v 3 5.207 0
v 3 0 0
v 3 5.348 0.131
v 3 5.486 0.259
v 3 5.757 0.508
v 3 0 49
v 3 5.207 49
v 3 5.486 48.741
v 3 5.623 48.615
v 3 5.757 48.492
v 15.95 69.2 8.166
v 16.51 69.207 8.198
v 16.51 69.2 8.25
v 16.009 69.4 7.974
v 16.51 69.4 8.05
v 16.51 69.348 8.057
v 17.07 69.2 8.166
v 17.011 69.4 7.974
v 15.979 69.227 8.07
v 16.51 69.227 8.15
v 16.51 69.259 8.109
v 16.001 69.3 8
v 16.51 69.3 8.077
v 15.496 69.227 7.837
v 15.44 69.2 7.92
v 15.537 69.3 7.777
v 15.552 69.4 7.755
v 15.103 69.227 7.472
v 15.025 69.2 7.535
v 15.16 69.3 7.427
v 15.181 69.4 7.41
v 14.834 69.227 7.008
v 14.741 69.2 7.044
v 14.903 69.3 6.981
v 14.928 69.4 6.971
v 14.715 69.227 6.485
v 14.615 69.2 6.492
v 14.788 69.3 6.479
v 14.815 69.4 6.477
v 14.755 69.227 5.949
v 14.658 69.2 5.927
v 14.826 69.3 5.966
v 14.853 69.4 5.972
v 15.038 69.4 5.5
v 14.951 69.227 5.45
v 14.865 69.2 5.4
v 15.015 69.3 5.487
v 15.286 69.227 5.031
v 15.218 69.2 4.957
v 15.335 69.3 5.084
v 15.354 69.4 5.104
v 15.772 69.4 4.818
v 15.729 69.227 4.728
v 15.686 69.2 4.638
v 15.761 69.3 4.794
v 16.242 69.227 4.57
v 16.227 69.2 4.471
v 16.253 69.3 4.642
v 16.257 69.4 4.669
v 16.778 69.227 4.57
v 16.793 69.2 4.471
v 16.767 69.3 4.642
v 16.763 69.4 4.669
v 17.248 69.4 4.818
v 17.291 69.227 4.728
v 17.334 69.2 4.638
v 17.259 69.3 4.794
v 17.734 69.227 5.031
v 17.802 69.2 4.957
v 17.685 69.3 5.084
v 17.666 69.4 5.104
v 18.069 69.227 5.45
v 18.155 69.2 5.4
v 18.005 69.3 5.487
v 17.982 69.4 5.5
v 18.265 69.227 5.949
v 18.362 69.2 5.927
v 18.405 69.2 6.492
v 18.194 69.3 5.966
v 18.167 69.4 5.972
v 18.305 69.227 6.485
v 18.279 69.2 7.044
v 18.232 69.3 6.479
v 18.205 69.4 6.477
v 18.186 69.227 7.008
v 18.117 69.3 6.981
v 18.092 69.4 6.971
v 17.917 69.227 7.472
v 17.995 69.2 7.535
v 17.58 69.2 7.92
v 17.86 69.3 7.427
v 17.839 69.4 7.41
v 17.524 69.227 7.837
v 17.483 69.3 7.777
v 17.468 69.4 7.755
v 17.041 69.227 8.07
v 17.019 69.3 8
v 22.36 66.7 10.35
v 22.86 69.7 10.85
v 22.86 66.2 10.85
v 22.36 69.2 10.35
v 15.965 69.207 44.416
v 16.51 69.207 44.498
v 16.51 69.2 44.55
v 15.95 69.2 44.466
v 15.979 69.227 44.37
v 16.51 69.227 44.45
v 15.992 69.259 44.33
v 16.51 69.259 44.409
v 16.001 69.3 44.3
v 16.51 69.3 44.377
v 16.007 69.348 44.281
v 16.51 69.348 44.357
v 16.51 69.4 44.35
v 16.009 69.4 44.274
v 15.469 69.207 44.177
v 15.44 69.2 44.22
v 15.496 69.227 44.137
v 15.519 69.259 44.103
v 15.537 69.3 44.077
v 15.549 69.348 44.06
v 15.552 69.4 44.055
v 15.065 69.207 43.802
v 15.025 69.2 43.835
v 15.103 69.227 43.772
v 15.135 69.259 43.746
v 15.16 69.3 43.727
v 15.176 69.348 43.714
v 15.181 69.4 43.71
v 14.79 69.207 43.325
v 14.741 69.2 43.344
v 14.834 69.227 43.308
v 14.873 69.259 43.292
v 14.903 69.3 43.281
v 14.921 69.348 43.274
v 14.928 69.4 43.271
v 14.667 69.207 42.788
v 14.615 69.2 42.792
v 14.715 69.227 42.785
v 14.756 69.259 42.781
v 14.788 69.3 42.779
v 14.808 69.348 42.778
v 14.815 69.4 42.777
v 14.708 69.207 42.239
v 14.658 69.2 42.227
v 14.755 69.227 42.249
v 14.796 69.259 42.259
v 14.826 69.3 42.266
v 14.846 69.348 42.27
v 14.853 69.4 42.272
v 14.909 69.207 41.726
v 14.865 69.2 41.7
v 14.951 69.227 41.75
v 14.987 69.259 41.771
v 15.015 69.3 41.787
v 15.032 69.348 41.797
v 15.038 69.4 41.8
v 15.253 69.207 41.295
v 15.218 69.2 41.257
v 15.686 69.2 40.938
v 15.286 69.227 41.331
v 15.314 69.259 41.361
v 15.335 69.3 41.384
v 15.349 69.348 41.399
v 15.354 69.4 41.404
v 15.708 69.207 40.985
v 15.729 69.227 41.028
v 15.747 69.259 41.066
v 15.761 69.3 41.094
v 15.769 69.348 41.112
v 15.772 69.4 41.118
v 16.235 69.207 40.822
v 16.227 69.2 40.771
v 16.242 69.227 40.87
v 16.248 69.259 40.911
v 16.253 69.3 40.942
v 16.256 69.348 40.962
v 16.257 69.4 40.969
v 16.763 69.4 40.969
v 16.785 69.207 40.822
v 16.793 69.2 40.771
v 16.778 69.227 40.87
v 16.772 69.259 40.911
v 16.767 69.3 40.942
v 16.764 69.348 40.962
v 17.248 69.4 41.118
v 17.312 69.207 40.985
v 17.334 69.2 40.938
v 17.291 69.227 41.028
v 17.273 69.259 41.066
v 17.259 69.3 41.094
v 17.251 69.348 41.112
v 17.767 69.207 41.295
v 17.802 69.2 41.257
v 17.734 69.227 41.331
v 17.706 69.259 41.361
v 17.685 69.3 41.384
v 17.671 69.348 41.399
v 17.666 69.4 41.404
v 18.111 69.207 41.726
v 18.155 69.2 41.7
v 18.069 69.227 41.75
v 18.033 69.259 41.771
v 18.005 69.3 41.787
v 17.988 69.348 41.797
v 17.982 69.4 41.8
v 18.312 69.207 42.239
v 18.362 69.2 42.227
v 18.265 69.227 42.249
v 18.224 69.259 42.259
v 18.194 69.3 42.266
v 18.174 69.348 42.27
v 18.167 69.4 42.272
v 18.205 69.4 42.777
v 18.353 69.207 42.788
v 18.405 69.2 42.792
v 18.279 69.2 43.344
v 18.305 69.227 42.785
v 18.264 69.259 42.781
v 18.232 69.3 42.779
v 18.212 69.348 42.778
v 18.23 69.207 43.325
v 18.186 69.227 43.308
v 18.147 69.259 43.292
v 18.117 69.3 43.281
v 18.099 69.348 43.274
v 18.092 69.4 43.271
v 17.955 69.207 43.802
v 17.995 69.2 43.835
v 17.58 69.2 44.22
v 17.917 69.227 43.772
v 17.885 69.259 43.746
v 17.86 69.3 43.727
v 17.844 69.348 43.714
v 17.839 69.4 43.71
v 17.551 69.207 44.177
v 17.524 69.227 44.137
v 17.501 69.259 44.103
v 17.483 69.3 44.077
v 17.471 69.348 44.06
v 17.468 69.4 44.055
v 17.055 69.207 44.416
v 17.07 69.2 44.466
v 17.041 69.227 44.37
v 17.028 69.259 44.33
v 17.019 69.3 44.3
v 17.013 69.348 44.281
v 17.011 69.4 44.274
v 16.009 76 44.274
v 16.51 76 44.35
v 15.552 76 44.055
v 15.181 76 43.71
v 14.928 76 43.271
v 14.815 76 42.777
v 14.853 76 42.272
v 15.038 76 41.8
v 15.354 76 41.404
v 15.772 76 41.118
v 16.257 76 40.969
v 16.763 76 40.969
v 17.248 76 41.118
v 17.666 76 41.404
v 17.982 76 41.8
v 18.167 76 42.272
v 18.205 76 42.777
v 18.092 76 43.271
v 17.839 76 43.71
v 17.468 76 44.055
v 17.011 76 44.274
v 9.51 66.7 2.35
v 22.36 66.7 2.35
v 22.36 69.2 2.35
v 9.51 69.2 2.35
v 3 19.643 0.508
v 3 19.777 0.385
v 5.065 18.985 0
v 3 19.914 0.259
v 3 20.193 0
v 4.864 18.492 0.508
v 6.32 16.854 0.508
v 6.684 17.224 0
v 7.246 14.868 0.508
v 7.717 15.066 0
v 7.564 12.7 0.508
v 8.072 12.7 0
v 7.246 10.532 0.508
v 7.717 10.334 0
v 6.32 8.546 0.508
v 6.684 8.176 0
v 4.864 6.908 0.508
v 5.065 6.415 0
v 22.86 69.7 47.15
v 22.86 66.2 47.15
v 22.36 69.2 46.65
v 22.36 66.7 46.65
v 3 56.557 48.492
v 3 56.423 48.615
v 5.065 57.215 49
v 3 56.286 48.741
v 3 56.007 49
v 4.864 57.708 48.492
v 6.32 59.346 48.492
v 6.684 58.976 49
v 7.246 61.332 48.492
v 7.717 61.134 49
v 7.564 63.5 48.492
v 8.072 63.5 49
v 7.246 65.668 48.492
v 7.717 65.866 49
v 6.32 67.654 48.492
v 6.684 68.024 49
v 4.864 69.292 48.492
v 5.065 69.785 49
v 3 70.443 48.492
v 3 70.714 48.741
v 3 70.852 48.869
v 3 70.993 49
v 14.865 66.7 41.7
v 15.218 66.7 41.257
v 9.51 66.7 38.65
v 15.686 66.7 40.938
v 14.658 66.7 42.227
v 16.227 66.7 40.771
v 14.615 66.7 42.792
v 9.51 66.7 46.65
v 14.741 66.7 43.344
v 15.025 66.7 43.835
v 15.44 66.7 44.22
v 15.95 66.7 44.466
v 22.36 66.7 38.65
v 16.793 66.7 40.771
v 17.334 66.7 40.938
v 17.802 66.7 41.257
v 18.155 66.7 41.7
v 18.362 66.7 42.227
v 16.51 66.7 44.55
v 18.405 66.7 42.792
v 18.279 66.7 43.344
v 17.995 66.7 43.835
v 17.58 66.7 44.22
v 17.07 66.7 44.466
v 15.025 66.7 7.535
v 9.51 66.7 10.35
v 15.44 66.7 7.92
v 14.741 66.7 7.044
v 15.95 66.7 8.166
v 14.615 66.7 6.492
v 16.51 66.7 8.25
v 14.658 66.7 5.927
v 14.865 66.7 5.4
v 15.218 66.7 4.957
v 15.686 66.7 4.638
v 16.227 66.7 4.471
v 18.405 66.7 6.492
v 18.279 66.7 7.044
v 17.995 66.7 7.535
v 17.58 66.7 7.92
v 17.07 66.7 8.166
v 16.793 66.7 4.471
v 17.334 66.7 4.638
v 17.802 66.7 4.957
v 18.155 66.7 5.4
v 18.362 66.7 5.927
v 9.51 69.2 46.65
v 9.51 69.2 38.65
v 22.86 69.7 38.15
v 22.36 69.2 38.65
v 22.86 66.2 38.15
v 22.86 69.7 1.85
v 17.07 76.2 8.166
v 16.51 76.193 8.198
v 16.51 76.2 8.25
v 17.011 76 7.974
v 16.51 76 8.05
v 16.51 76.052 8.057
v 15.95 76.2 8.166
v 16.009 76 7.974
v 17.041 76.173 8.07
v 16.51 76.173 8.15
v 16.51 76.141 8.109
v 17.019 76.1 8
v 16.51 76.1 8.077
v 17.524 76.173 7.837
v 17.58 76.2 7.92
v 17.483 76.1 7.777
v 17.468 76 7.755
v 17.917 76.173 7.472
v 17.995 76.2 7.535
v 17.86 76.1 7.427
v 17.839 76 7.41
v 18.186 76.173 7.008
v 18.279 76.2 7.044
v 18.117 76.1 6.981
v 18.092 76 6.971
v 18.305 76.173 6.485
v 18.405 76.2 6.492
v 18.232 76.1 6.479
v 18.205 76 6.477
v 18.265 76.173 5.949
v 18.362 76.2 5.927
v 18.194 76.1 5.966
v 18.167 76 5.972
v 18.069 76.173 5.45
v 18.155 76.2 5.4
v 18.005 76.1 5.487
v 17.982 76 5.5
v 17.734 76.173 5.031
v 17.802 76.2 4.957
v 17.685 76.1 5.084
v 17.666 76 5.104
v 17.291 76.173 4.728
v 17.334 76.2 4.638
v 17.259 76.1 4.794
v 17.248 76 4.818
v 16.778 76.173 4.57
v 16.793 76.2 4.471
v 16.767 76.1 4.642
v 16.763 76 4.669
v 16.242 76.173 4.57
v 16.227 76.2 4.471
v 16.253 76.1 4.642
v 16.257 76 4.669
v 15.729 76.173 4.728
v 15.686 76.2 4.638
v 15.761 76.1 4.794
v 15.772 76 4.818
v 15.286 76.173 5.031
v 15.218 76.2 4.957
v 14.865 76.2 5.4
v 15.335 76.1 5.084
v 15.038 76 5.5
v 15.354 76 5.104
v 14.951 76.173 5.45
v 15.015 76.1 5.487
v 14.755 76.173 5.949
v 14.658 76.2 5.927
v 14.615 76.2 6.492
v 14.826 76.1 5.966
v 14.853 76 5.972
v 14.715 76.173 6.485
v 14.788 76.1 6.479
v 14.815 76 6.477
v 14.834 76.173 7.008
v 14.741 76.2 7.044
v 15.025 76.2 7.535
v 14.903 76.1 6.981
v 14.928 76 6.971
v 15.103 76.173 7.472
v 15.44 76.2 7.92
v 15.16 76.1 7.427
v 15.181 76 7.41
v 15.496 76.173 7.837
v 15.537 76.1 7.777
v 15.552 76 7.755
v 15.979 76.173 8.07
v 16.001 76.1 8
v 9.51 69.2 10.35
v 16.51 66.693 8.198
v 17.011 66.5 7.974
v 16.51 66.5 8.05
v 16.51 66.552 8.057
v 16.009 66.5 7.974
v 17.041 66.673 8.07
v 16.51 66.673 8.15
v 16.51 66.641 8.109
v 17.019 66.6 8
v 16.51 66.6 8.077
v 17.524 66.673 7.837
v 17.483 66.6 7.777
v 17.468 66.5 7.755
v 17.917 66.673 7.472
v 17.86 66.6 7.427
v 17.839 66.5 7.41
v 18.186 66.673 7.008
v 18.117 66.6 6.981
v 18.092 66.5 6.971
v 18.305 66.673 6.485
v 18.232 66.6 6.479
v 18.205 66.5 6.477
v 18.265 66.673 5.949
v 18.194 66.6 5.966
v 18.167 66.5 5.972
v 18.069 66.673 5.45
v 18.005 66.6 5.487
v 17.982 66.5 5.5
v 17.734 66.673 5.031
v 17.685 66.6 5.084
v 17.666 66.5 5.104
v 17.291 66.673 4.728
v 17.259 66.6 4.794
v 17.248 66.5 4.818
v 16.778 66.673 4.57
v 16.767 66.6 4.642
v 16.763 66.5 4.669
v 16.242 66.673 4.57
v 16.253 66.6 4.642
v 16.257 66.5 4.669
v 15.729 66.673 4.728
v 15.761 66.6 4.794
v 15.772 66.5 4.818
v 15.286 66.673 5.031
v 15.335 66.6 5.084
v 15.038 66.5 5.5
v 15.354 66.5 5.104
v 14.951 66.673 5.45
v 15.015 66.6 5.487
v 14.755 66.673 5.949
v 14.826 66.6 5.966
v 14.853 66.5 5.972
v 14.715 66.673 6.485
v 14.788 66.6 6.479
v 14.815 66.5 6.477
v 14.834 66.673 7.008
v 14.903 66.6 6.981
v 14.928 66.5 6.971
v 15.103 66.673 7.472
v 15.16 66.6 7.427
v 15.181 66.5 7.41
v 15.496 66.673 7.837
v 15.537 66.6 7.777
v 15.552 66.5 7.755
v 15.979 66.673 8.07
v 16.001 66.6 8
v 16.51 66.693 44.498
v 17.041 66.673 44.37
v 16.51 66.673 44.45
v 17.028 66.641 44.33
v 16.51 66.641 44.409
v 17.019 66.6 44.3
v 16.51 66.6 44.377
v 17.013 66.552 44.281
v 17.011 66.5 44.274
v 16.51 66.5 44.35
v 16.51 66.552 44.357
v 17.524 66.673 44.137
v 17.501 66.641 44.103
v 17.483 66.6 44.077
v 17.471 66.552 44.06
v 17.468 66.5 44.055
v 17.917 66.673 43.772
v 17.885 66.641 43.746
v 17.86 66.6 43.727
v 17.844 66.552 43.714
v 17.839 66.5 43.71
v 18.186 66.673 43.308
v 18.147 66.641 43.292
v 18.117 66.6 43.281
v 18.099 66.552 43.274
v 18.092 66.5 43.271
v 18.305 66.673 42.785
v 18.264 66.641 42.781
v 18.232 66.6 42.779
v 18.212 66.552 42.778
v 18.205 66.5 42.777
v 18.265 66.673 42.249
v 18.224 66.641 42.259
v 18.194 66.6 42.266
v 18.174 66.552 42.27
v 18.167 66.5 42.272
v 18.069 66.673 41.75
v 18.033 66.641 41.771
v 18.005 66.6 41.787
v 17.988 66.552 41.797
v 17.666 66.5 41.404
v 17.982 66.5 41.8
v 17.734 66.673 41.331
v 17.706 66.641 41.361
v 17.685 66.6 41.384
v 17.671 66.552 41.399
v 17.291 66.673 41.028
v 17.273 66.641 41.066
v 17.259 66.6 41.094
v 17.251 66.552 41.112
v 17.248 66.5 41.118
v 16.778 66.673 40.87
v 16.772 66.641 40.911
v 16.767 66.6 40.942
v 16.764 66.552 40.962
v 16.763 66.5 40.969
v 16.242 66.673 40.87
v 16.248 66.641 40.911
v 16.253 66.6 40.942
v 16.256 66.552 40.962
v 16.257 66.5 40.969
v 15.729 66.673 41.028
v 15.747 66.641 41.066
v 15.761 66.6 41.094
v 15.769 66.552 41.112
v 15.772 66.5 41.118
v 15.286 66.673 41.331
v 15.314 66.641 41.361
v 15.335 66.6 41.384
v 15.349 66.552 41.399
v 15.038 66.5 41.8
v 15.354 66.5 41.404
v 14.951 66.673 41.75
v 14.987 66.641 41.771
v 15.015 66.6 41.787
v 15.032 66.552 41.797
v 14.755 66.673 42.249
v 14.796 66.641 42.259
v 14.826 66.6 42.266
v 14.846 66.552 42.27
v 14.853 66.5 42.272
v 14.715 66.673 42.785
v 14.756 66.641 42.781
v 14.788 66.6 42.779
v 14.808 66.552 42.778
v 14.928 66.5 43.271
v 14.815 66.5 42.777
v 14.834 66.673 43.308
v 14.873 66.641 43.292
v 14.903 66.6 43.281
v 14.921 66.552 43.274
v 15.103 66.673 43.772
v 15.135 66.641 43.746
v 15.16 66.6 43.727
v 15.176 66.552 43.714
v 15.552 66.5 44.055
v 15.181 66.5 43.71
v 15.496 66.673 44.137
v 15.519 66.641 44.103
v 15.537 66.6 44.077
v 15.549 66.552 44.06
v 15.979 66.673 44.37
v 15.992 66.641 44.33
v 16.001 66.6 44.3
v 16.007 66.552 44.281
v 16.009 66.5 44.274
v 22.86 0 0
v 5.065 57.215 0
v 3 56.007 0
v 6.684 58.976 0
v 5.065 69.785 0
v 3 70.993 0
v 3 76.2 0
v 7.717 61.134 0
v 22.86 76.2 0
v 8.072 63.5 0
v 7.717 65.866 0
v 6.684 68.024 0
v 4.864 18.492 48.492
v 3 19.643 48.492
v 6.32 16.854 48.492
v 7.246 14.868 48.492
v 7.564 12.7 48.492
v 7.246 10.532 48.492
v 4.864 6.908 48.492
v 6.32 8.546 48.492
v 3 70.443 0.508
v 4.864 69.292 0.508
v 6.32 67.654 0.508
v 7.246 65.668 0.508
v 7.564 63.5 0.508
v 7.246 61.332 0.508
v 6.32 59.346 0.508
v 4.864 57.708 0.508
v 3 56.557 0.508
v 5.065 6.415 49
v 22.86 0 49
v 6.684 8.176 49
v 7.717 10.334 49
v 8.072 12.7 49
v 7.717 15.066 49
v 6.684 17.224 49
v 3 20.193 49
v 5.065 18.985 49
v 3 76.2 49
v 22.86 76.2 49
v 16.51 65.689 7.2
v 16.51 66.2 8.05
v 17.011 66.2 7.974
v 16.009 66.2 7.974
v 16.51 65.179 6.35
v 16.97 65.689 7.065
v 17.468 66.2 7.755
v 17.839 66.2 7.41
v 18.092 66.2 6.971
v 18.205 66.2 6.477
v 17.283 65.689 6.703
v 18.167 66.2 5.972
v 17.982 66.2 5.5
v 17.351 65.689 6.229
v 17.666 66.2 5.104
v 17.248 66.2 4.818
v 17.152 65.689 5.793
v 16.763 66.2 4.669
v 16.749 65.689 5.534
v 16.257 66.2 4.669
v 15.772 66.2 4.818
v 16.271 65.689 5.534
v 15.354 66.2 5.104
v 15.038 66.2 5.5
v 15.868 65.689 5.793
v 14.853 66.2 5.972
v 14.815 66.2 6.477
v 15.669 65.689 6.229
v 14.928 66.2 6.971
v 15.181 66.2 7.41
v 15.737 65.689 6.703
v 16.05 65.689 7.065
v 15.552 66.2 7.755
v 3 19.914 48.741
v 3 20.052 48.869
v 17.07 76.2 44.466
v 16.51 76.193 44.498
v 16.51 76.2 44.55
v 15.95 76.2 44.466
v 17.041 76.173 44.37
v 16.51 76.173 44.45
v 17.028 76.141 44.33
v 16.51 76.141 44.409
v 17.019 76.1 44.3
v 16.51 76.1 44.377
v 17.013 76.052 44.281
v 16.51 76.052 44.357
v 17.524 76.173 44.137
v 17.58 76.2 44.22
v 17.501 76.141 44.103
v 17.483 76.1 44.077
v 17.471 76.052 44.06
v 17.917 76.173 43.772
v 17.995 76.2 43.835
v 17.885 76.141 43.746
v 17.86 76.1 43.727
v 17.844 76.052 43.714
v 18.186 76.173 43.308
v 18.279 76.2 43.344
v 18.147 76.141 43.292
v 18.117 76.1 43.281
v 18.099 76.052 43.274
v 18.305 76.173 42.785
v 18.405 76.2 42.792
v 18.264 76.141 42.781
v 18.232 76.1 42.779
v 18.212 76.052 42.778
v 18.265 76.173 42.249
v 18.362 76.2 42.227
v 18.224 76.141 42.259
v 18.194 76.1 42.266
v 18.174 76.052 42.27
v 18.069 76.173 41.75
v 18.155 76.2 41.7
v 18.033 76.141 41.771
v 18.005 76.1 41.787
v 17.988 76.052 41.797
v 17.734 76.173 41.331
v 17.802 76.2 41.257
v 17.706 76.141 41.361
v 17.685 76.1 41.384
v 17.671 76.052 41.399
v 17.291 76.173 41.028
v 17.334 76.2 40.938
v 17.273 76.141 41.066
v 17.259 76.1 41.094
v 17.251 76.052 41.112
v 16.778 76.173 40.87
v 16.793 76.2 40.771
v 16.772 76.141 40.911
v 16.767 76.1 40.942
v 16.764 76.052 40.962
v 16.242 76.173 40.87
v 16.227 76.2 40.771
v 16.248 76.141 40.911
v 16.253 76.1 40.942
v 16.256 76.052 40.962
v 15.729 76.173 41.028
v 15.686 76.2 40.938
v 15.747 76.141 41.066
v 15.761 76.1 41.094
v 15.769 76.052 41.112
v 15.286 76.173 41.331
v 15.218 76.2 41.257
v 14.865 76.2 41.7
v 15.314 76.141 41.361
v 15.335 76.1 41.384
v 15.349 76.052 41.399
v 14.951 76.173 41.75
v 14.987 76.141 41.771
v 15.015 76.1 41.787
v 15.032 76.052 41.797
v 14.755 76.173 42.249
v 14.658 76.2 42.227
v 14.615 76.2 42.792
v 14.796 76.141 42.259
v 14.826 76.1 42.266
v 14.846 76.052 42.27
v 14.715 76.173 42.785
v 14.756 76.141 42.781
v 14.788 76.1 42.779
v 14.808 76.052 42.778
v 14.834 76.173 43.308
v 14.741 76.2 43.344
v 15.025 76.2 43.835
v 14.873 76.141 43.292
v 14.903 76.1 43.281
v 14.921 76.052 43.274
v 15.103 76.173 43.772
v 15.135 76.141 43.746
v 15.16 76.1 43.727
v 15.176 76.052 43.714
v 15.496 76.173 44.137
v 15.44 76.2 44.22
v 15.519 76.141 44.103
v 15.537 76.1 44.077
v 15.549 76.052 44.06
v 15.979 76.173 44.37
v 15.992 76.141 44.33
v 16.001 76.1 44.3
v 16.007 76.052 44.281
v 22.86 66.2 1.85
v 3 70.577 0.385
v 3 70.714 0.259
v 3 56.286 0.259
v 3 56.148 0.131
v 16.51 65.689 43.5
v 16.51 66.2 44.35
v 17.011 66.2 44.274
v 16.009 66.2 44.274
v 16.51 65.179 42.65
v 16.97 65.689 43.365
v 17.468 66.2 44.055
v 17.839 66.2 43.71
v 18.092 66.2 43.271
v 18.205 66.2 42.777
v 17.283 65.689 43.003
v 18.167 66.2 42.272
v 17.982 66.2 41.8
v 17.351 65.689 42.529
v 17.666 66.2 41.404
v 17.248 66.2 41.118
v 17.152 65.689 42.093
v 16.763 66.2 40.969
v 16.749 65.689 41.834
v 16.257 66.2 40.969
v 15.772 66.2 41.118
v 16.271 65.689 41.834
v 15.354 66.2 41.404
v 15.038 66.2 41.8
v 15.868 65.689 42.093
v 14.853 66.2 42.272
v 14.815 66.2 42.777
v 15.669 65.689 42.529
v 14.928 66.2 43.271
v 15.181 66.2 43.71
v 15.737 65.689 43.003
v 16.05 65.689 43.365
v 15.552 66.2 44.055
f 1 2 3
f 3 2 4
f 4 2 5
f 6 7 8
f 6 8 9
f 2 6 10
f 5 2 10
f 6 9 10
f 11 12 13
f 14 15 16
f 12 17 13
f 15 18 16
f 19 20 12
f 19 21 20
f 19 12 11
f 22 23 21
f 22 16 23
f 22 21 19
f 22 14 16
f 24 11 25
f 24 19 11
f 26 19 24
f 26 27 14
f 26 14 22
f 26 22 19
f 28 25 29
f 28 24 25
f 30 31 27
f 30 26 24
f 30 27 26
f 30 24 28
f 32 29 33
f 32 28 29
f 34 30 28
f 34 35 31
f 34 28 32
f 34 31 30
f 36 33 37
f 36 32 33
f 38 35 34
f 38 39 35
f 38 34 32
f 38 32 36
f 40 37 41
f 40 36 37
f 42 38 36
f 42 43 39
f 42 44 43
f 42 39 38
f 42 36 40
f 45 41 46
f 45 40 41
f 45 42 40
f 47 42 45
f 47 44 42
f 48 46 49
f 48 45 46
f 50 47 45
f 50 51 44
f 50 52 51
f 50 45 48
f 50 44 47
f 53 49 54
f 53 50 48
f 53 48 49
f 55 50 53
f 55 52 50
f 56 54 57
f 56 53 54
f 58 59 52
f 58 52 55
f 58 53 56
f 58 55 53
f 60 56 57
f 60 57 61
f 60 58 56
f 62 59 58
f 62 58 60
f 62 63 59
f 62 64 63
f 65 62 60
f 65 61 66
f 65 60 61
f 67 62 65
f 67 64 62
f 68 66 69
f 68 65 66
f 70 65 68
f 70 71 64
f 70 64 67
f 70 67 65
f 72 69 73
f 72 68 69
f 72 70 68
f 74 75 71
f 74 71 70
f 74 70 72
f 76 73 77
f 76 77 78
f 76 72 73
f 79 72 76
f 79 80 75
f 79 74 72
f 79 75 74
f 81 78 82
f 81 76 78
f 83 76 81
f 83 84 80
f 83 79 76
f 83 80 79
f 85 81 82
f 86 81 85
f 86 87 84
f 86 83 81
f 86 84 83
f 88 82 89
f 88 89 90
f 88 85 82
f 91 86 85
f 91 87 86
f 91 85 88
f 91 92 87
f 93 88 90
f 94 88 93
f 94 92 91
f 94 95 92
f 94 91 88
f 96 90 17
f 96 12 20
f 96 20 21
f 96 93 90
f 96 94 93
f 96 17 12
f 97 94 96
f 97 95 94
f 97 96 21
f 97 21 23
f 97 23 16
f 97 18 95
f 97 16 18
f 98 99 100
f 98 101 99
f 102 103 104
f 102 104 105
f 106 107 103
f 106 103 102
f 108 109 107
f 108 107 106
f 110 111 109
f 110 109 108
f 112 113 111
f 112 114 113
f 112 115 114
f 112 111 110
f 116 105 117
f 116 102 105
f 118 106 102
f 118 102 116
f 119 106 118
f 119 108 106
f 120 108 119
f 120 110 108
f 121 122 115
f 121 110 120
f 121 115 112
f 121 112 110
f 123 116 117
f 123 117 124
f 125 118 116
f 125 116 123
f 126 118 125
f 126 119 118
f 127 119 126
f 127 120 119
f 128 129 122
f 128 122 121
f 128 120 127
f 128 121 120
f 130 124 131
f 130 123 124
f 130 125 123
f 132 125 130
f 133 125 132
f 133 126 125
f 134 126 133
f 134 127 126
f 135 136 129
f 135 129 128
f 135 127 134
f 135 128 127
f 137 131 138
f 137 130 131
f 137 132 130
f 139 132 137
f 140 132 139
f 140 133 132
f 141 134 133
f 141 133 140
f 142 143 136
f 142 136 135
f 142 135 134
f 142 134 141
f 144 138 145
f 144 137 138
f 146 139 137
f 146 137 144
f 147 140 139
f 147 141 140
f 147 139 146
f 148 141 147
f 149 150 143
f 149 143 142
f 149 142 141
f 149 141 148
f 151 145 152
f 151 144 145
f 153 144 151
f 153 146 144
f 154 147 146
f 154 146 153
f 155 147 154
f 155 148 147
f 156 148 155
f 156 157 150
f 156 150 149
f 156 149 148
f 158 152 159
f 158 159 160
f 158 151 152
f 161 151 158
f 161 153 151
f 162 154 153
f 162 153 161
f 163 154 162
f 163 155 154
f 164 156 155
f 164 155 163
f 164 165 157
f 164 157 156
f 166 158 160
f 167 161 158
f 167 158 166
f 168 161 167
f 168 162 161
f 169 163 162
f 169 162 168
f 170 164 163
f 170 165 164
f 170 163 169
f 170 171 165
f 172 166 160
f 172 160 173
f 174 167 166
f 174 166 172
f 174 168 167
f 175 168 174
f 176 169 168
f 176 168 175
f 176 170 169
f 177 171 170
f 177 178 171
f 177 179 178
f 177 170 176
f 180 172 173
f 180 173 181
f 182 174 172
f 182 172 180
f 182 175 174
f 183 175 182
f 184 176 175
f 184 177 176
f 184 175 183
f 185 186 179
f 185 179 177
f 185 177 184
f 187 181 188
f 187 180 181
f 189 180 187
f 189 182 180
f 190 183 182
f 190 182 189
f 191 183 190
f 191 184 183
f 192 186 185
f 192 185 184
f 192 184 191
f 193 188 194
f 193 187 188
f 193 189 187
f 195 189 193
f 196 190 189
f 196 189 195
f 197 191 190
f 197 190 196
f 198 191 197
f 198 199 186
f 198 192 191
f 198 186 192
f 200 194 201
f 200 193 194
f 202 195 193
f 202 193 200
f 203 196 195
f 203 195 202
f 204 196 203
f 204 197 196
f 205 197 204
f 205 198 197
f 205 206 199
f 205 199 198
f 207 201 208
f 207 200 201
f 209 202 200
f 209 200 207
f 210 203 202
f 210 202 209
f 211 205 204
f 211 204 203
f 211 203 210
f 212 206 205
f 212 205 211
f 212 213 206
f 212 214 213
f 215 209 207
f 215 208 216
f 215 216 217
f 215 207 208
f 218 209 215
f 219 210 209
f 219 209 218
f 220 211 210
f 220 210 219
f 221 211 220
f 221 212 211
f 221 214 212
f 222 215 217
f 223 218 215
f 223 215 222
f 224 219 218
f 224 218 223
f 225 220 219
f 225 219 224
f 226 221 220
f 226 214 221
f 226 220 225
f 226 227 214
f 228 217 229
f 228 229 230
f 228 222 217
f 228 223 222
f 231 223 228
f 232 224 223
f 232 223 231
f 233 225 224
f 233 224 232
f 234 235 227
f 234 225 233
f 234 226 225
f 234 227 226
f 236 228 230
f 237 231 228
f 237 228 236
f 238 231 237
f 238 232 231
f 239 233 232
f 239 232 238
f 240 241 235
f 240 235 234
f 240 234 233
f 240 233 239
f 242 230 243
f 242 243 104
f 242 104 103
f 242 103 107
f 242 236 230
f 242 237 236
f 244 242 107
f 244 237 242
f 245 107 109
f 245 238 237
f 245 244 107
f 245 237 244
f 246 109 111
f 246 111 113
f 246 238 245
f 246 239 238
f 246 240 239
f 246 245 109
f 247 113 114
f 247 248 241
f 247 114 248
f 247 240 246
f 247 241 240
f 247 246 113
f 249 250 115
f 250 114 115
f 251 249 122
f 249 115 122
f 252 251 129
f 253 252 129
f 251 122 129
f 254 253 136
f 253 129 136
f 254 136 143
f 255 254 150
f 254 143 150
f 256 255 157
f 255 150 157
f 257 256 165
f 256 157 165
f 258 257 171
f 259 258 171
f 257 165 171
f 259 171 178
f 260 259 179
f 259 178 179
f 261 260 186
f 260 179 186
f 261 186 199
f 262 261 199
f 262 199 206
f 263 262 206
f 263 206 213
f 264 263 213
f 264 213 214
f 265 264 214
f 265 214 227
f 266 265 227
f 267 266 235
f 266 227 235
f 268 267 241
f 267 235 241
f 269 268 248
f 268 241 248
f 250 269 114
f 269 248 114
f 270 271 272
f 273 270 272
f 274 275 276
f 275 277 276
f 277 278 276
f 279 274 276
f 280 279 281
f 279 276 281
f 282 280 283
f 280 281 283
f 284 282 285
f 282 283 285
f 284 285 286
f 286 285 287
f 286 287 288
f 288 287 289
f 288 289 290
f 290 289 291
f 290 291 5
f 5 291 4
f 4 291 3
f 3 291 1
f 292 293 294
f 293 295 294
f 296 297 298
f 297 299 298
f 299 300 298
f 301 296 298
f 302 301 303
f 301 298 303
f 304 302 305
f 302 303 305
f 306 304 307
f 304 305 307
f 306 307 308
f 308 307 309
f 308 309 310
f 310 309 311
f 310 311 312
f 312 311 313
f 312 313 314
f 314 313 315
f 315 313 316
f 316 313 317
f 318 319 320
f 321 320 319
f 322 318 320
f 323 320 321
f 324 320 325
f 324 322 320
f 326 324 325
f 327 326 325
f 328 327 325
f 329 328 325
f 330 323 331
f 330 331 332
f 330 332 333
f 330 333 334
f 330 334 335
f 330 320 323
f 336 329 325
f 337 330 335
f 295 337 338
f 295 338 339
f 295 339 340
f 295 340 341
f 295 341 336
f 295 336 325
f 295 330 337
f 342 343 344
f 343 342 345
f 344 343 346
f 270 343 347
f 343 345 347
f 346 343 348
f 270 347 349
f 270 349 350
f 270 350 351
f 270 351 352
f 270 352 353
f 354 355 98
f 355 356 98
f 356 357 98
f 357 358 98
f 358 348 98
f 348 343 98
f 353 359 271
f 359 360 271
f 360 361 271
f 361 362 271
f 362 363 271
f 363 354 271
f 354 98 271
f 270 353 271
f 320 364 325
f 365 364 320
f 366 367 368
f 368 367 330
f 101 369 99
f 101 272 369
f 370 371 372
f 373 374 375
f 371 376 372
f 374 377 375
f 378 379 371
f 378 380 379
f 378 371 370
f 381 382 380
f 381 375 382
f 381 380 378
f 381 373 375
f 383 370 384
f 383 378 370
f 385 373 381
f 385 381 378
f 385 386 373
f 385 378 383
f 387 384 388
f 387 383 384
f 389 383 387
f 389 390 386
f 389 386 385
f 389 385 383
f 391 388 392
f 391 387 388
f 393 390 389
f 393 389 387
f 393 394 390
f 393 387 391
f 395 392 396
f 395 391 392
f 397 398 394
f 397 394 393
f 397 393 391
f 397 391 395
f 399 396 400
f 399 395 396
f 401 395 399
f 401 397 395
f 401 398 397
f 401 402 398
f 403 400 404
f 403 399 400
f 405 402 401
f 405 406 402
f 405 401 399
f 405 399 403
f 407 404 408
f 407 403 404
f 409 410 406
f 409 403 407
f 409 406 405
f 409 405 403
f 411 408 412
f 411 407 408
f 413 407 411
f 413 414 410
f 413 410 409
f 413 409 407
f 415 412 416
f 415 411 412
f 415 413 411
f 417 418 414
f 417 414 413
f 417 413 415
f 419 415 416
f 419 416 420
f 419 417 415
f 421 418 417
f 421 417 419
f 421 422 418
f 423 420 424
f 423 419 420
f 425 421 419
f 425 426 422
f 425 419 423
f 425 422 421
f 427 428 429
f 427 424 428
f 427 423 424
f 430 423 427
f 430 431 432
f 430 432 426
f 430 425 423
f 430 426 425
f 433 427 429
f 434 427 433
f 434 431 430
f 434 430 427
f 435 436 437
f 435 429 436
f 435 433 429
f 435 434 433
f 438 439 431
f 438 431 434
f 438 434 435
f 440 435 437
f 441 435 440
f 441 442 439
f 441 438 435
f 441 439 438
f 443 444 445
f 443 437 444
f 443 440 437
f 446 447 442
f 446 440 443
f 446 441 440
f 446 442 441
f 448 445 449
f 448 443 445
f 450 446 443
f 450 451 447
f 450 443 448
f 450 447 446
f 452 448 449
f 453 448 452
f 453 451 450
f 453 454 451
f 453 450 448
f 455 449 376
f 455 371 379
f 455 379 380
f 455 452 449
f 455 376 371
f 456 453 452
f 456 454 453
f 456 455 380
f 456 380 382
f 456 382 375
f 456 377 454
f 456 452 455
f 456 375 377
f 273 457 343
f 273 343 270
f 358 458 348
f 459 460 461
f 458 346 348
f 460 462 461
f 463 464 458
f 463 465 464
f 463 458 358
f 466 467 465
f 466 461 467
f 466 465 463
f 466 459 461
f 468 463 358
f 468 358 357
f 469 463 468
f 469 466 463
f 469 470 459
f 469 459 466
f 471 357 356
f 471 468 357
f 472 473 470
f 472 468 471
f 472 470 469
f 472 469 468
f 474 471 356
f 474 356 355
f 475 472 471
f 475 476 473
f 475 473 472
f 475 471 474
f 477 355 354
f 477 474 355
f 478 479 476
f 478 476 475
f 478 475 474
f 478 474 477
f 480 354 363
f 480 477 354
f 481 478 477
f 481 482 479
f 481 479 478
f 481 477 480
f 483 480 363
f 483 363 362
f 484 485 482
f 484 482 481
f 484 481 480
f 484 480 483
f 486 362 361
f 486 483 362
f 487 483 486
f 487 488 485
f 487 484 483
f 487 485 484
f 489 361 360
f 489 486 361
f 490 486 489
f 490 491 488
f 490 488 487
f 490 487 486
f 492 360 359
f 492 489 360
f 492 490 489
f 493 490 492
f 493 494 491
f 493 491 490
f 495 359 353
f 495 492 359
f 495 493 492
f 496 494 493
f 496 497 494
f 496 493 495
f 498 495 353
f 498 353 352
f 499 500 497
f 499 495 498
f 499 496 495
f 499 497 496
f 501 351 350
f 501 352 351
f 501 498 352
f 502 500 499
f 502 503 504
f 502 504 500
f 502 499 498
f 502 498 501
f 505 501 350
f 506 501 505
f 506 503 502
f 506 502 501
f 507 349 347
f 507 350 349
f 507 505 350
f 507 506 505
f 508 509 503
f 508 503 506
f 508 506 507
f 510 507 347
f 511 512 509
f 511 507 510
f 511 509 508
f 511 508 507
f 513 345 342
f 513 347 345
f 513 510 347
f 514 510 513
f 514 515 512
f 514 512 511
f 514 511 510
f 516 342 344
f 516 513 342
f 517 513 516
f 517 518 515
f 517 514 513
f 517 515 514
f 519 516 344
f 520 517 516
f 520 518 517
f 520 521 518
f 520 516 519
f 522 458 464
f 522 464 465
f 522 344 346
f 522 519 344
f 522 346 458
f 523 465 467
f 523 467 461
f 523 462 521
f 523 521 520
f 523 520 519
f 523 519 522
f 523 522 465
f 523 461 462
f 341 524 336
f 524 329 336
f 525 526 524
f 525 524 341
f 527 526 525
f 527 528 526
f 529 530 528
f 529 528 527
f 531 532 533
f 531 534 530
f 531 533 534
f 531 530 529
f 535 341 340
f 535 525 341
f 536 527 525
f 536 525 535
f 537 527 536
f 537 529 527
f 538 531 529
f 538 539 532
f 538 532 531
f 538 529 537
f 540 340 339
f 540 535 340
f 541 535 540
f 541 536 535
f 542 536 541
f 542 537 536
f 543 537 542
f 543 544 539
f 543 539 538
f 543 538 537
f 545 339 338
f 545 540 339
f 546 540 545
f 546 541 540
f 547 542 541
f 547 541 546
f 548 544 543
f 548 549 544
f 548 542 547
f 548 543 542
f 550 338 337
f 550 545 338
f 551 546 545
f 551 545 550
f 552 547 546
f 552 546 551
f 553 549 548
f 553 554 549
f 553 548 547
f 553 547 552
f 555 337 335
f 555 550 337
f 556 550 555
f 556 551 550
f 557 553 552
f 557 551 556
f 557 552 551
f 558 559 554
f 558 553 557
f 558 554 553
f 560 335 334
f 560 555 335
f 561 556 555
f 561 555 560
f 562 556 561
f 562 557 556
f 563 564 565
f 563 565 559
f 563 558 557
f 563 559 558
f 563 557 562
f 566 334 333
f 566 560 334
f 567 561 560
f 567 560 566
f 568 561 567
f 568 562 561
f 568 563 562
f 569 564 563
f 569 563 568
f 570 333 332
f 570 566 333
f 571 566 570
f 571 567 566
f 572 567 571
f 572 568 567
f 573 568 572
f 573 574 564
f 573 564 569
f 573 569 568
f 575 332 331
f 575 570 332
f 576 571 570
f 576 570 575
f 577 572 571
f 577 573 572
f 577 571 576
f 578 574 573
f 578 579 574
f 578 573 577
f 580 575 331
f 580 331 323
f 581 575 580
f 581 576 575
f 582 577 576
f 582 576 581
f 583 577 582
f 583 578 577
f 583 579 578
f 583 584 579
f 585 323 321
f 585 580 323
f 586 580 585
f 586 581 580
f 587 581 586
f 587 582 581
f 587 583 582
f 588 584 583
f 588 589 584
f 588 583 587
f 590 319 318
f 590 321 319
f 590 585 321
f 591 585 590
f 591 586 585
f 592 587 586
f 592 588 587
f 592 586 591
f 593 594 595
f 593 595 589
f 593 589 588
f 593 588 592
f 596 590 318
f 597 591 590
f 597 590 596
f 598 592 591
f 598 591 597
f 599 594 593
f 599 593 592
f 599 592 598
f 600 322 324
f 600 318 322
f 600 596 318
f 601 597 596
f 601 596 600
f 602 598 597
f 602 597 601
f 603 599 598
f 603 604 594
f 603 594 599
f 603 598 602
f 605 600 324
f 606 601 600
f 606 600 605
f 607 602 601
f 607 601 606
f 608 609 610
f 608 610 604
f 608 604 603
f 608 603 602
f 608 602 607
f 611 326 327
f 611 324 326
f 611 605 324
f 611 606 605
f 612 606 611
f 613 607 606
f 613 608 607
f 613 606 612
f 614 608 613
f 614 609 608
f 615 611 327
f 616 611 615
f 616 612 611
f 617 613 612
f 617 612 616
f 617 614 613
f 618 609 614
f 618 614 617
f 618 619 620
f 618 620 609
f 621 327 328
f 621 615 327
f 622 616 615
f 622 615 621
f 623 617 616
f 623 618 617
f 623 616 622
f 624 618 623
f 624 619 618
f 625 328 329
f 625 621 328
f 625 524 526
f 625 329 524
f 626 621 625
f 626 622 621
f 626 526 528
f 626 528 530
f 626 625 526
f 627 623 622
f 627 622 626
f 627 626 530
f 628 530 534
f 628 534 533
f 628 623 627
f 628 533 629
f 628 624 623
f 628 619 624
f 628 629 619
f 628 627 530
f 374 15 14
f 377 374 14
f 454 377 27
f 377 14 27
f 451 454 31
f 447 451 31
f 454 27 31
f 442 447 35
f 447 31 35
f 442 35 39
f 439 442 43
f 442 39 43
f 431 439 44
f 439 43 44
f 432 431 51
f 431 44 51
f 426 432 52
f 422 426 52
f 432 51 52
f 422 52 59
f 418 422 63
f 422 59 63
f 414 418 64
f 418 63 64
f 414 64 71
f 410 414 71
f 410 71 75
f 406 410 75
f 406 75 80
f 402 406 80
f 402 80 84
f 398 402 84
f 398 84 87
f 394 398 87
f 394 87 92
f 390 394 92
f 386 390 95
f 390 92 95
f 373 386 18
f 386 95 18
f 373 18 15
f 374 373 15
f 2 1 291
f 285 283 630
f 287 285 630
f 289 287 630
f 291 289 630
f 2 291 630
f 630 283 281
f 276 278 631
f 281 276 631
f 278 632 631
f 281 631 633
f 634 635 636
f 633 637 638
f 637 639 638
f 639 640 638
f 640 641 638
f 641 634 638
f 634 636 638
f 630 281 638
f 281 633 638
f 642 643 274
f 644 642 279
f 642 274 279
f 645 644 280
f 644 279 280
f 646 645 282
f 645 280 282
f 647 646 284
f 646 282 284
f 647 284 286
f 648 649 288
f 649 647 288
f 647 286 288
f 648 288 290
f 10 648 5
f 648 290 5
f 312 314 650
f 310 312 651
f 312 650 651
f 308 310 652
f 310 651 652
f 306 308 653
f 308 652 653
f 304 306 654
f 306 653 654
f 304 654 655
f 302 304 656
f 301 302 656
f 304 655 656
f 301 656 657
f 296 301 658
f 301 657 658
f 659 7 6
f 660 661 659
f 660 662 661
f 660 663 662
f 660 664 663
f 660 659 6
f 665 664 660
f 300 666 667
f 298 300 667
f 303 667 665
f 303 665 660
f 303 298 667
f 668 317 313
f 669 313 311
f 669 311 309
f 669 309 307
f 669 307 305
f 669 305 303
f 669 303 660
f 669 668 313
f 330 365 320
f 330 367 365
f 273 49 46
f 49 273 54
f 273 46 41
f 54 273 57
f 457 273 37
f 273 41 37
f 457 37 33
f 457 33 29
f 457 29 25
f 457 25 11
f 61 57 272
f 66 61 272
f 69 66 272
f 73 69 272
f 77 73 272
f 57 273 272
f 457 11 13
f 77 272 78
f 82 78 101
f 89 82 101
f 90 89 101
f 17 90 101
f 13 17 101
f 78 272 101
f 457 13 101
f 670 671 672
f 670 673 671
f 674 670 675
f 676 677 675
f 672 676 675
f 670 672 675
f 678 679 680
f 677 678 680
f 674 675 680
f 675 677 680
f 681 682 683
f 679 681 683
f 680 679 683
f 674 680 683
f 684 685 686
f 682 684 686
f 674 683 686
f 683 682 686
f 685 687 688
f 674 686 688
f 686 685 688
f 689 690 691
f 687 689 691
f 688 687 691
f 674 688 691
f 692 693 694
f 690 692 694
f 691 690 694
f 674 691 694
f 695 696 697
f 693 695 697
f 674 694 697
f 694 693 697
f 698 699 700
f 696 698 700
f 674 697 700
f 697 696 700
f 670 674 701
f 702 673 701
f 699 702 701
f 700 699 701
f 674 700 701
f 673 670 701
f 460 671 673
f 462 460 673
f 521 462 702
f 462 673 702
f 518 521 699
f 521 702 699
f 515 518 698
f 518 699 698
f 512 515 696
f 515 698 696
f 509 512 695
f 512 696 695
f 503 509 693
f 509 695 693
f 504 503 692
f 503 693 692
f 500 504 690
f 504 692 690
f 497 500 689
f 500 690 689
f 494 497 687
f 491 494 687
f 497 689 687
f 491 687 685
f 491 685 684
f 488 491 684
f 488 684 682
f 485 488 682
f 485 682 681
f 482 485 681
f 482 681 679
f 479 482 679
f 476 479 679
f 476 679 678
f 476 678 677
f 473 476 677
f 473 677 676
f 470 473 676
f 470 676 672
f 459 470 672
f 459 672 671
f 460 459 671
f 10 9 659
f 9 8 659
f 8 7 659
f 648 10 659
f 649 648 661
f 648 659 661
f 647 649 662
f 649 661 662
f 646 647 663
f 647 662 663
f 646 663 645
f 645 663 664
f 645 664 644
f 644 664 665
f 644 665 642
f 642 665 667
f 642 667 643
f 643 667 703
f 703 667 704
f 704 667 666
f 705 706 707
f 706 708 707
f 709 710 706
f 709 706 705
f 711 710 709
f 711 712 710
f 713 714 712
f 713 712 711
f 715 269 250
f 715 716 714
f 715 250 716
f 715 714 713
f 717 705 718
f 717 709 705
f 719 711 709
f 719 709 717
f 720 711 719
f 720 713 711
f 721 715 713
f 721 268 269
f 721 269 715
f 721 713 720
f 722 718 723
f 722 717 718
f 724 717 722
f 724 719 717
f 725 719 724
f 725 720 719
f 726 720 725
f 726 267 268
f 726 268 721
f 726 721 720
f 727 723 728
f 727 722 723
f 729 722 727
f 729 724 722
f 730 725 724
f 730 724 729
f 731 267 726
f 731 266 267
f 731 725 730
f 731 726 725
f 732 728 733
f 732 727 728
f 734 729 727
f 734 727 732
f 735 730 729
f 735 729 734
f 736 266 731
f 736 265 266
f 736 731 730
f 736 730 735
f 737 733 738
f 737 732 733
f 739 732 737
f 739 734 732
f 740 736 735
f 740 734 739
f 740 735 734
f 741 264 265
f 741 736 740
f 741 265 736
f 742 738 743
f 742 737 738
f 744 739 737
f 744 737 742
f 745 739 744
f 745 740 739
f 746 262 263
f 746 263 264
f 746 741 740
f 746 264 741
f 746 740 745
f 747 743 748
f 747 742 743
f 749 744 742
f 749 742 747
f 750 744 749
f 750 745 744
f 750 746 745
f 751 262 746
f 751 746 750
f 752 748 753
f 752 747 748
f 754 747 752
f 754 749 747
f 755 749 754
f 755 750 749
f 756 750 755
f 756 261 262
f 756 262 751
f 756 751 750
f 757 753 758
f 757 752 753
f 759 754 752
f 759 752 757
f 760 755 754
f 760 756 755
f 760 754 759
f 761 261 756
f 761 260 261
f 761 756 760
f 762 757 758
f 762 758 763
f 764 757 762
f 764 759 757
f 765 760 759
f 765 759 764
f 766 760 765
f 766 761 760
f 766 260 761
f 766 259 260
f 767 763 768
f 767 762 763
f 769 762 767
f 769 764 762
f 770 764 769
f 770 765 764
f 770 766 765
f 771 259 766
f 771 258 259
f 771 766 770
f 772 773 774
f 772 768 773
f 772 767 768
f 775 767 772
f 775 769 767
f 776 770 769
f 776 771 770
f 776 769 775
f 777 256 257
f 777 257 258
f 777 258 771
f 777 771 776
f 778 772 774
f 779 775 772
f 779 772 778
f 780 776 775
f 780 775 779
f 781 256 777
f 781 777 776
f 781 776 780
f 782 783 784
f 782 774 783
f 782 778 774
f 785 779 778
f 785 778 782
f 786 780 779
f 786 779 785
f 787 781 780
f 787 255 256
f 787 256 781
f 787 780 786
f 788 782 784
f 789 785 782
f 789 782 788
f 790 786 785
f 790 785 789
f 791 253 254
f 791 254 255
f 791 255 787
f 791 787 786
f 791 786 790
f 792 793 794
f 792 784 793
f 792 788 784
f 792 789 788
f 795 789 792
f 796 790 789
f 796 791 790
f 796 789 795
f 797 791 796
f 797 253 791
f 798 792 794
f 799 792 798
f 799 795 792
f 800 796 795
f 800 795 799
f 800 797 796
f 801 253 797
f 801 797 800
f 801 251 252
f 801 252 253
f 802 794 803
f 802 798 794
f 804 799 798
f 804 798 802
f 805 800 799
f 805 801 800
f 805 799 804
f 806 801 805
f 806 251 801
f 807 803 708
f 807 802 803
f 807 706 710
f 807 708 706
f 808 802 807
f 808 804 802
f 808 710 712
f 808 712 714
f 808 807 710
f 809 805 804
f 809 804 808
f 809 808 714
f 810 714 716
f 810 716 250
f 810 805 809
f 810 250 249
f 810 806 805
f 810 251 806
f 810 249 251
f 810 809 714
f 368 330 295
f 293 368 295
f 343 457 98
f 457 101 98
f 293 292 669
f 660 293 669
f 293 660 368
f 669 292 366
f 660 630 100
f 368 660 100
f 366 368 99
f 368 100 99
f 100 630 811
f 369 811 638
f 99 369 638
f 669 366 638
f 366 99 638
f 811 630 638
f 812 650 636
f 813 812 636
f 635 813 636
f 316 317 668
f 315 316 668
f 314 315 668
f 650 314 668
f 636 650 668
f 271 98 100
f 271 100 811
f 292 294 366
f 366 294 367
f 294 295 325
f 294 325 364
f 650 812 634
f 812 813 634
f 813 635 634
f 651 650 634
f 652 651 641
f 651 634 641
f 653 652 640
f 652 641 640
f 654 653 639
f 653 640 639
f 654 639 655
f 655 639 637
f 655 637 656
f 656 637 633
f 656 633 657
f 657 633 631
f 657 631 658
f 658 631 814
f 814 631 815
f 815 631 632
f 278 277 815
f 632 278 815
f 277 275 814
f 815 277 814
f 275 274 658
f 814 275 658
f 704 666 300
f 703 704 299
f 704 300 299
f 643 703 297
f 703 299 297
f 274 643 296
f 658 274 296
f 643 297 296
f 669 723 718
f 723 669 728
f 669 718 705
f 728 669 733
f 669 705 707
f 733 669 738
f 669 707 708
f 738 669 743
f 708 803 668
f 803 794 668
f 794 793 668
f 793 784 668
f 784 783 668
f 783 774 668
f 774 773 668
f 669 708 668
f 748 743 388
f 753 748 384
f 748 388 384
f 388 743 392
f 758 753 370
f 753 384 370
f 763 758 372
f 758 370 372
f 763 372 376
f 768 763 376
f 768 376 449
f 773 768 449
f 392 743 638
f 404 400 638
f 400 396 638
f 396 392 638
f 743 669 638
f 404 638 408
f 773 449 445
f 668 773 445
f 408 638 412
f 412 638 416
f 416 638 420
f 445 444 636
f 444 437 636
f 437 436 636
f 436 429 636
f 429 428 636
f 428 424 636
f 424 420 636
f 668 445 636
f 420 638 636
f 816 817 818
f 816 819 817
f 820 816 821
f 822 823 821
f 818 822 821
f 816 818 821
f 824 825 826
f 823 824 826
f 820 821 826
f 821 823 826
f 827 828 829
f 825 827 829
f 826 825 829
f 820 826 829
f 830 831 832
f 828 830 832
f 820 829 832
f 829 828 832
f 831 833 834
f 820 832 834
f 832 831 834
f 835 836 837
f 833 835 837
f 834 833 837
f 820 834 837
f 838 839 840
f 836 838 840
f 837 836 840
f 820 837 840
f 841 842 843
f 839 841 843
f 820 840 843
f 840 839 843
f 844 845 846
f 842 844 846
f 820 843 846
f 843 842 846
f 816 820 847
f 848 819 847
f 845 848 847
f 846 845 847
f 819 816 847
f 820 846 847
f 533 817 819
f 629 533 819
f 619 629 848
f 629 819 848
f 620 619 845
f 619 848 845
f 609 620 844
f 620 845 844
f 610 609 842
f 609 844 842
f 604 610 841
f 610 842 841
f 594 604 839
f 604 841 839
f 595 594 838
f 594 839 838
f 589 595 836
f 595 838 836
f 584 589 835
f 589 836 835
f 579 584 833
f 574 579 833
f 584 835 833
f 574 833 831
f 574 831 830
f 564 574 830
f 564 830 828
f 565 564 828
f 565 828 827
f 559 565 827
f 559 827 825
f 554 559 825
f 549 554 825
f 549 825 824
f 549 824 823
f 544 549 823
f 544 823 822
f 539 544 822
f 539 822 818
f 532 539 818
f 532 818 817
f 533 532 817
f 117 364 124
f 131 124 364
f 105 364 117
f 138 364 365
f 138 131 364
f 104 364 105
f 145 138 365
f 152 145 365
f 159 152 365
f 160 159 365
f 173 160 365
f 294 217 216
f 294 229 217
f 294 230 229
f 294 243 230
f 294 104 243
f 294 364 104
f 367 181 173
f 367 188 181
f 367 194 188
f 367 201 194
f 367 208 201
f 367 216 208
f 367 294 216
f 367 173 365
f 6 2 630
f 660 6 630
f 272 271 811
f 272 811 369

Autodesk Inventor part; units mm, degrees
ref_plane "XZ Plane" through (0, 0, 0) normal (0, 1, 0) x (-1, 0, 0)
sketch "Sketch1" plane through (0, 0, 0) normal (0, 0, 1) x (1, 0, 0)
  line L0 (-22.86, 0) -> (22.86, 0)
  line L1 (22.86, 0) -> (22.86, 76.2)
  line L2 (22.86, 76.2) -> (-22.86, 76.2)
  line L3 (-22.86, 76.2) -> (-22.86, 0)
  circle A0 centre (0, 63.5) radius 7.5635
  circle A1 centre (0, 12.7) radius 7.5635
  point P0 (0, 0)
  point P1 (0, 76.2)
  point P2 (0, 0)
  dimension "d0" = 76.2
  dimension "d1" = 15.127
  dimension "d2" = 15.127
  dimension "d3" = 45.72
  dimension "d4" = 12.7
  dimension "d5" = 50.8
  dimension "d7" = 12.7
  dimension "d8" = 0
extrude "Extrusion1" add sketch "Sketch1" along normal blind 49
chamfer "Chamfer1" distance 0.508 angle 45 4 edges at (-7.5635, 63.5, 49) (-7.5635, 12.7, 49) (-7.5635, 63.5, 0) (-7.5635, 12.7, 0)
ref_plane "Work Plane1" through (0, 0, 0) normal (1, 0, 0) x (0, 1, 0)
ref_plane "Work Plane2" through (3, 0, 0) normal (1, 0, 0) x (0, 1, 0)
sketch "Sketch4" plane through (3, 0, 0) normal (1, 0, 0) x (0, 1, 0)
  line L0 (80.0176, -3.1701) -> (-4.1539, -3.1701)
  line L1 (-4.1539, -3.1701) -> (-4.1539, 52.5799)
  line L2 (-4.1539, 52.5799) -> (80.0176, 52.5799)
  line L3 (80.0176, 52.5799) -> (80.0176, -3.1701)
  point P0 (0, 0)
extrude "Extrusion3" cut sketch "Sketch4" against normal blind 100
sketch "Sketch5" plane through (22.86, 76.2, 49) normal (0, 1, 0) x (1, 0, 0)
  circle A0 centre (-6.35, 42.65) radius 2.6622
  circle A1 centre (-6.35, 6.35) radius 2.7742
  line L0 (0, 49) -> (0, 0) projected
  line L1 (0, 49) -> (-19.86, 49) projected
  line L2 (0, 0) -> (-19.86, 0) projected
  point P0 (-22.86, 49)
  dimension "d29" = 5.3244
  dimension "d30" = 6.35
  dimension "d31" = 6.35
  dimension "d32" = 6.35
  dimension "d33" = 6.35
hole "Hole1" at (16.51, 76.2, 42.65) at (16.51, 76.2, 6.35) direction (0, -1, 0) diameter 3.4 depth 10 tip angle 118 clearance for "Socket Head Cap Screw" size "M3" standard "Ansi Metric M Profile"
sketch "Sketch6" plane through (22.86, 0, 0) normal (1, 0, 0) x (0, 0, -1)
  line L0 (-44.35, 76.2) -> (-40.95, 76.2) projected
  line L1 (-8.05, 76.2) -> (-4.65, 76.2) projected
  line L2 (-42.65, 76.2) -> (-42.65, 0)
  line L3 (0, 0) -> (-49, 0) projected
  line L4 (0, 76.2) -> (-49, 76.2) projected
  line L5 (-24.5, 76.2) -> (-24.5, 0)
  line L6 (-49, 0) -> (0, 0) projected
  line L7 (-46.65, 69.2) -> (-38.65, 69.2)
  line L8 (-38.65, 69.2) -> (-38.65, 66.7)
  line L9 (-38.65, 66.7) -> (-46.65, 66.7)
  line L10 (-46.65, 66.7) -> (-46.65, 69.2)
  line L11 (-2.35, 69.2) -> (-10.35, 69.2)
  line L12 (-10.35, 69.2) -> (-10.35, 66.7)
  line L13 (-10.35, 66.7) -> (-2.35, 66.7)
  line L14 (-2.35, 66.7) -> (-2.35, 69.2)
  point P0 (-42.65, 69.2)
  point P1 (-38.65, 67.95)
  point P2 (-46.65, 67.95)
  dimension "d41" = 2.5
  dimension "d42" = 7
  dimension "d43" = 8
extrude "Extrusion4" cut sketch "Sketch6" against normal blind 13.35 contours L7 L8 L9 L2 | L2 L9 L10 L7 | L14 L13 L12 L11
fillet "Fillet1" radius 0.2 6 edges at (16.51, 76.2, 40.95) (16.51, 76.2, 4.65) (16.51, 66.7, 4.65) (16.51, 69.2, 4.65) (16.51, 69.2, 40.95) (16.51, 66.7, 40.95)
chamfer "Chamfer2" distance 0.5 angle 45 8 edges at (22.86, 69.2, 42.65) (22.86, 67.95, 38.65) (22.86, 66.7, 42.65) (22.86, 67.95, 46.65) (22.86, 69.2, 6.35) (22.86, 67.95, 10.35) (22.86, 66.7, 6.35) (22.86, 67.95, 2.35)
equation "\"d1\" = d2"
properties part number "Carriage Design"
